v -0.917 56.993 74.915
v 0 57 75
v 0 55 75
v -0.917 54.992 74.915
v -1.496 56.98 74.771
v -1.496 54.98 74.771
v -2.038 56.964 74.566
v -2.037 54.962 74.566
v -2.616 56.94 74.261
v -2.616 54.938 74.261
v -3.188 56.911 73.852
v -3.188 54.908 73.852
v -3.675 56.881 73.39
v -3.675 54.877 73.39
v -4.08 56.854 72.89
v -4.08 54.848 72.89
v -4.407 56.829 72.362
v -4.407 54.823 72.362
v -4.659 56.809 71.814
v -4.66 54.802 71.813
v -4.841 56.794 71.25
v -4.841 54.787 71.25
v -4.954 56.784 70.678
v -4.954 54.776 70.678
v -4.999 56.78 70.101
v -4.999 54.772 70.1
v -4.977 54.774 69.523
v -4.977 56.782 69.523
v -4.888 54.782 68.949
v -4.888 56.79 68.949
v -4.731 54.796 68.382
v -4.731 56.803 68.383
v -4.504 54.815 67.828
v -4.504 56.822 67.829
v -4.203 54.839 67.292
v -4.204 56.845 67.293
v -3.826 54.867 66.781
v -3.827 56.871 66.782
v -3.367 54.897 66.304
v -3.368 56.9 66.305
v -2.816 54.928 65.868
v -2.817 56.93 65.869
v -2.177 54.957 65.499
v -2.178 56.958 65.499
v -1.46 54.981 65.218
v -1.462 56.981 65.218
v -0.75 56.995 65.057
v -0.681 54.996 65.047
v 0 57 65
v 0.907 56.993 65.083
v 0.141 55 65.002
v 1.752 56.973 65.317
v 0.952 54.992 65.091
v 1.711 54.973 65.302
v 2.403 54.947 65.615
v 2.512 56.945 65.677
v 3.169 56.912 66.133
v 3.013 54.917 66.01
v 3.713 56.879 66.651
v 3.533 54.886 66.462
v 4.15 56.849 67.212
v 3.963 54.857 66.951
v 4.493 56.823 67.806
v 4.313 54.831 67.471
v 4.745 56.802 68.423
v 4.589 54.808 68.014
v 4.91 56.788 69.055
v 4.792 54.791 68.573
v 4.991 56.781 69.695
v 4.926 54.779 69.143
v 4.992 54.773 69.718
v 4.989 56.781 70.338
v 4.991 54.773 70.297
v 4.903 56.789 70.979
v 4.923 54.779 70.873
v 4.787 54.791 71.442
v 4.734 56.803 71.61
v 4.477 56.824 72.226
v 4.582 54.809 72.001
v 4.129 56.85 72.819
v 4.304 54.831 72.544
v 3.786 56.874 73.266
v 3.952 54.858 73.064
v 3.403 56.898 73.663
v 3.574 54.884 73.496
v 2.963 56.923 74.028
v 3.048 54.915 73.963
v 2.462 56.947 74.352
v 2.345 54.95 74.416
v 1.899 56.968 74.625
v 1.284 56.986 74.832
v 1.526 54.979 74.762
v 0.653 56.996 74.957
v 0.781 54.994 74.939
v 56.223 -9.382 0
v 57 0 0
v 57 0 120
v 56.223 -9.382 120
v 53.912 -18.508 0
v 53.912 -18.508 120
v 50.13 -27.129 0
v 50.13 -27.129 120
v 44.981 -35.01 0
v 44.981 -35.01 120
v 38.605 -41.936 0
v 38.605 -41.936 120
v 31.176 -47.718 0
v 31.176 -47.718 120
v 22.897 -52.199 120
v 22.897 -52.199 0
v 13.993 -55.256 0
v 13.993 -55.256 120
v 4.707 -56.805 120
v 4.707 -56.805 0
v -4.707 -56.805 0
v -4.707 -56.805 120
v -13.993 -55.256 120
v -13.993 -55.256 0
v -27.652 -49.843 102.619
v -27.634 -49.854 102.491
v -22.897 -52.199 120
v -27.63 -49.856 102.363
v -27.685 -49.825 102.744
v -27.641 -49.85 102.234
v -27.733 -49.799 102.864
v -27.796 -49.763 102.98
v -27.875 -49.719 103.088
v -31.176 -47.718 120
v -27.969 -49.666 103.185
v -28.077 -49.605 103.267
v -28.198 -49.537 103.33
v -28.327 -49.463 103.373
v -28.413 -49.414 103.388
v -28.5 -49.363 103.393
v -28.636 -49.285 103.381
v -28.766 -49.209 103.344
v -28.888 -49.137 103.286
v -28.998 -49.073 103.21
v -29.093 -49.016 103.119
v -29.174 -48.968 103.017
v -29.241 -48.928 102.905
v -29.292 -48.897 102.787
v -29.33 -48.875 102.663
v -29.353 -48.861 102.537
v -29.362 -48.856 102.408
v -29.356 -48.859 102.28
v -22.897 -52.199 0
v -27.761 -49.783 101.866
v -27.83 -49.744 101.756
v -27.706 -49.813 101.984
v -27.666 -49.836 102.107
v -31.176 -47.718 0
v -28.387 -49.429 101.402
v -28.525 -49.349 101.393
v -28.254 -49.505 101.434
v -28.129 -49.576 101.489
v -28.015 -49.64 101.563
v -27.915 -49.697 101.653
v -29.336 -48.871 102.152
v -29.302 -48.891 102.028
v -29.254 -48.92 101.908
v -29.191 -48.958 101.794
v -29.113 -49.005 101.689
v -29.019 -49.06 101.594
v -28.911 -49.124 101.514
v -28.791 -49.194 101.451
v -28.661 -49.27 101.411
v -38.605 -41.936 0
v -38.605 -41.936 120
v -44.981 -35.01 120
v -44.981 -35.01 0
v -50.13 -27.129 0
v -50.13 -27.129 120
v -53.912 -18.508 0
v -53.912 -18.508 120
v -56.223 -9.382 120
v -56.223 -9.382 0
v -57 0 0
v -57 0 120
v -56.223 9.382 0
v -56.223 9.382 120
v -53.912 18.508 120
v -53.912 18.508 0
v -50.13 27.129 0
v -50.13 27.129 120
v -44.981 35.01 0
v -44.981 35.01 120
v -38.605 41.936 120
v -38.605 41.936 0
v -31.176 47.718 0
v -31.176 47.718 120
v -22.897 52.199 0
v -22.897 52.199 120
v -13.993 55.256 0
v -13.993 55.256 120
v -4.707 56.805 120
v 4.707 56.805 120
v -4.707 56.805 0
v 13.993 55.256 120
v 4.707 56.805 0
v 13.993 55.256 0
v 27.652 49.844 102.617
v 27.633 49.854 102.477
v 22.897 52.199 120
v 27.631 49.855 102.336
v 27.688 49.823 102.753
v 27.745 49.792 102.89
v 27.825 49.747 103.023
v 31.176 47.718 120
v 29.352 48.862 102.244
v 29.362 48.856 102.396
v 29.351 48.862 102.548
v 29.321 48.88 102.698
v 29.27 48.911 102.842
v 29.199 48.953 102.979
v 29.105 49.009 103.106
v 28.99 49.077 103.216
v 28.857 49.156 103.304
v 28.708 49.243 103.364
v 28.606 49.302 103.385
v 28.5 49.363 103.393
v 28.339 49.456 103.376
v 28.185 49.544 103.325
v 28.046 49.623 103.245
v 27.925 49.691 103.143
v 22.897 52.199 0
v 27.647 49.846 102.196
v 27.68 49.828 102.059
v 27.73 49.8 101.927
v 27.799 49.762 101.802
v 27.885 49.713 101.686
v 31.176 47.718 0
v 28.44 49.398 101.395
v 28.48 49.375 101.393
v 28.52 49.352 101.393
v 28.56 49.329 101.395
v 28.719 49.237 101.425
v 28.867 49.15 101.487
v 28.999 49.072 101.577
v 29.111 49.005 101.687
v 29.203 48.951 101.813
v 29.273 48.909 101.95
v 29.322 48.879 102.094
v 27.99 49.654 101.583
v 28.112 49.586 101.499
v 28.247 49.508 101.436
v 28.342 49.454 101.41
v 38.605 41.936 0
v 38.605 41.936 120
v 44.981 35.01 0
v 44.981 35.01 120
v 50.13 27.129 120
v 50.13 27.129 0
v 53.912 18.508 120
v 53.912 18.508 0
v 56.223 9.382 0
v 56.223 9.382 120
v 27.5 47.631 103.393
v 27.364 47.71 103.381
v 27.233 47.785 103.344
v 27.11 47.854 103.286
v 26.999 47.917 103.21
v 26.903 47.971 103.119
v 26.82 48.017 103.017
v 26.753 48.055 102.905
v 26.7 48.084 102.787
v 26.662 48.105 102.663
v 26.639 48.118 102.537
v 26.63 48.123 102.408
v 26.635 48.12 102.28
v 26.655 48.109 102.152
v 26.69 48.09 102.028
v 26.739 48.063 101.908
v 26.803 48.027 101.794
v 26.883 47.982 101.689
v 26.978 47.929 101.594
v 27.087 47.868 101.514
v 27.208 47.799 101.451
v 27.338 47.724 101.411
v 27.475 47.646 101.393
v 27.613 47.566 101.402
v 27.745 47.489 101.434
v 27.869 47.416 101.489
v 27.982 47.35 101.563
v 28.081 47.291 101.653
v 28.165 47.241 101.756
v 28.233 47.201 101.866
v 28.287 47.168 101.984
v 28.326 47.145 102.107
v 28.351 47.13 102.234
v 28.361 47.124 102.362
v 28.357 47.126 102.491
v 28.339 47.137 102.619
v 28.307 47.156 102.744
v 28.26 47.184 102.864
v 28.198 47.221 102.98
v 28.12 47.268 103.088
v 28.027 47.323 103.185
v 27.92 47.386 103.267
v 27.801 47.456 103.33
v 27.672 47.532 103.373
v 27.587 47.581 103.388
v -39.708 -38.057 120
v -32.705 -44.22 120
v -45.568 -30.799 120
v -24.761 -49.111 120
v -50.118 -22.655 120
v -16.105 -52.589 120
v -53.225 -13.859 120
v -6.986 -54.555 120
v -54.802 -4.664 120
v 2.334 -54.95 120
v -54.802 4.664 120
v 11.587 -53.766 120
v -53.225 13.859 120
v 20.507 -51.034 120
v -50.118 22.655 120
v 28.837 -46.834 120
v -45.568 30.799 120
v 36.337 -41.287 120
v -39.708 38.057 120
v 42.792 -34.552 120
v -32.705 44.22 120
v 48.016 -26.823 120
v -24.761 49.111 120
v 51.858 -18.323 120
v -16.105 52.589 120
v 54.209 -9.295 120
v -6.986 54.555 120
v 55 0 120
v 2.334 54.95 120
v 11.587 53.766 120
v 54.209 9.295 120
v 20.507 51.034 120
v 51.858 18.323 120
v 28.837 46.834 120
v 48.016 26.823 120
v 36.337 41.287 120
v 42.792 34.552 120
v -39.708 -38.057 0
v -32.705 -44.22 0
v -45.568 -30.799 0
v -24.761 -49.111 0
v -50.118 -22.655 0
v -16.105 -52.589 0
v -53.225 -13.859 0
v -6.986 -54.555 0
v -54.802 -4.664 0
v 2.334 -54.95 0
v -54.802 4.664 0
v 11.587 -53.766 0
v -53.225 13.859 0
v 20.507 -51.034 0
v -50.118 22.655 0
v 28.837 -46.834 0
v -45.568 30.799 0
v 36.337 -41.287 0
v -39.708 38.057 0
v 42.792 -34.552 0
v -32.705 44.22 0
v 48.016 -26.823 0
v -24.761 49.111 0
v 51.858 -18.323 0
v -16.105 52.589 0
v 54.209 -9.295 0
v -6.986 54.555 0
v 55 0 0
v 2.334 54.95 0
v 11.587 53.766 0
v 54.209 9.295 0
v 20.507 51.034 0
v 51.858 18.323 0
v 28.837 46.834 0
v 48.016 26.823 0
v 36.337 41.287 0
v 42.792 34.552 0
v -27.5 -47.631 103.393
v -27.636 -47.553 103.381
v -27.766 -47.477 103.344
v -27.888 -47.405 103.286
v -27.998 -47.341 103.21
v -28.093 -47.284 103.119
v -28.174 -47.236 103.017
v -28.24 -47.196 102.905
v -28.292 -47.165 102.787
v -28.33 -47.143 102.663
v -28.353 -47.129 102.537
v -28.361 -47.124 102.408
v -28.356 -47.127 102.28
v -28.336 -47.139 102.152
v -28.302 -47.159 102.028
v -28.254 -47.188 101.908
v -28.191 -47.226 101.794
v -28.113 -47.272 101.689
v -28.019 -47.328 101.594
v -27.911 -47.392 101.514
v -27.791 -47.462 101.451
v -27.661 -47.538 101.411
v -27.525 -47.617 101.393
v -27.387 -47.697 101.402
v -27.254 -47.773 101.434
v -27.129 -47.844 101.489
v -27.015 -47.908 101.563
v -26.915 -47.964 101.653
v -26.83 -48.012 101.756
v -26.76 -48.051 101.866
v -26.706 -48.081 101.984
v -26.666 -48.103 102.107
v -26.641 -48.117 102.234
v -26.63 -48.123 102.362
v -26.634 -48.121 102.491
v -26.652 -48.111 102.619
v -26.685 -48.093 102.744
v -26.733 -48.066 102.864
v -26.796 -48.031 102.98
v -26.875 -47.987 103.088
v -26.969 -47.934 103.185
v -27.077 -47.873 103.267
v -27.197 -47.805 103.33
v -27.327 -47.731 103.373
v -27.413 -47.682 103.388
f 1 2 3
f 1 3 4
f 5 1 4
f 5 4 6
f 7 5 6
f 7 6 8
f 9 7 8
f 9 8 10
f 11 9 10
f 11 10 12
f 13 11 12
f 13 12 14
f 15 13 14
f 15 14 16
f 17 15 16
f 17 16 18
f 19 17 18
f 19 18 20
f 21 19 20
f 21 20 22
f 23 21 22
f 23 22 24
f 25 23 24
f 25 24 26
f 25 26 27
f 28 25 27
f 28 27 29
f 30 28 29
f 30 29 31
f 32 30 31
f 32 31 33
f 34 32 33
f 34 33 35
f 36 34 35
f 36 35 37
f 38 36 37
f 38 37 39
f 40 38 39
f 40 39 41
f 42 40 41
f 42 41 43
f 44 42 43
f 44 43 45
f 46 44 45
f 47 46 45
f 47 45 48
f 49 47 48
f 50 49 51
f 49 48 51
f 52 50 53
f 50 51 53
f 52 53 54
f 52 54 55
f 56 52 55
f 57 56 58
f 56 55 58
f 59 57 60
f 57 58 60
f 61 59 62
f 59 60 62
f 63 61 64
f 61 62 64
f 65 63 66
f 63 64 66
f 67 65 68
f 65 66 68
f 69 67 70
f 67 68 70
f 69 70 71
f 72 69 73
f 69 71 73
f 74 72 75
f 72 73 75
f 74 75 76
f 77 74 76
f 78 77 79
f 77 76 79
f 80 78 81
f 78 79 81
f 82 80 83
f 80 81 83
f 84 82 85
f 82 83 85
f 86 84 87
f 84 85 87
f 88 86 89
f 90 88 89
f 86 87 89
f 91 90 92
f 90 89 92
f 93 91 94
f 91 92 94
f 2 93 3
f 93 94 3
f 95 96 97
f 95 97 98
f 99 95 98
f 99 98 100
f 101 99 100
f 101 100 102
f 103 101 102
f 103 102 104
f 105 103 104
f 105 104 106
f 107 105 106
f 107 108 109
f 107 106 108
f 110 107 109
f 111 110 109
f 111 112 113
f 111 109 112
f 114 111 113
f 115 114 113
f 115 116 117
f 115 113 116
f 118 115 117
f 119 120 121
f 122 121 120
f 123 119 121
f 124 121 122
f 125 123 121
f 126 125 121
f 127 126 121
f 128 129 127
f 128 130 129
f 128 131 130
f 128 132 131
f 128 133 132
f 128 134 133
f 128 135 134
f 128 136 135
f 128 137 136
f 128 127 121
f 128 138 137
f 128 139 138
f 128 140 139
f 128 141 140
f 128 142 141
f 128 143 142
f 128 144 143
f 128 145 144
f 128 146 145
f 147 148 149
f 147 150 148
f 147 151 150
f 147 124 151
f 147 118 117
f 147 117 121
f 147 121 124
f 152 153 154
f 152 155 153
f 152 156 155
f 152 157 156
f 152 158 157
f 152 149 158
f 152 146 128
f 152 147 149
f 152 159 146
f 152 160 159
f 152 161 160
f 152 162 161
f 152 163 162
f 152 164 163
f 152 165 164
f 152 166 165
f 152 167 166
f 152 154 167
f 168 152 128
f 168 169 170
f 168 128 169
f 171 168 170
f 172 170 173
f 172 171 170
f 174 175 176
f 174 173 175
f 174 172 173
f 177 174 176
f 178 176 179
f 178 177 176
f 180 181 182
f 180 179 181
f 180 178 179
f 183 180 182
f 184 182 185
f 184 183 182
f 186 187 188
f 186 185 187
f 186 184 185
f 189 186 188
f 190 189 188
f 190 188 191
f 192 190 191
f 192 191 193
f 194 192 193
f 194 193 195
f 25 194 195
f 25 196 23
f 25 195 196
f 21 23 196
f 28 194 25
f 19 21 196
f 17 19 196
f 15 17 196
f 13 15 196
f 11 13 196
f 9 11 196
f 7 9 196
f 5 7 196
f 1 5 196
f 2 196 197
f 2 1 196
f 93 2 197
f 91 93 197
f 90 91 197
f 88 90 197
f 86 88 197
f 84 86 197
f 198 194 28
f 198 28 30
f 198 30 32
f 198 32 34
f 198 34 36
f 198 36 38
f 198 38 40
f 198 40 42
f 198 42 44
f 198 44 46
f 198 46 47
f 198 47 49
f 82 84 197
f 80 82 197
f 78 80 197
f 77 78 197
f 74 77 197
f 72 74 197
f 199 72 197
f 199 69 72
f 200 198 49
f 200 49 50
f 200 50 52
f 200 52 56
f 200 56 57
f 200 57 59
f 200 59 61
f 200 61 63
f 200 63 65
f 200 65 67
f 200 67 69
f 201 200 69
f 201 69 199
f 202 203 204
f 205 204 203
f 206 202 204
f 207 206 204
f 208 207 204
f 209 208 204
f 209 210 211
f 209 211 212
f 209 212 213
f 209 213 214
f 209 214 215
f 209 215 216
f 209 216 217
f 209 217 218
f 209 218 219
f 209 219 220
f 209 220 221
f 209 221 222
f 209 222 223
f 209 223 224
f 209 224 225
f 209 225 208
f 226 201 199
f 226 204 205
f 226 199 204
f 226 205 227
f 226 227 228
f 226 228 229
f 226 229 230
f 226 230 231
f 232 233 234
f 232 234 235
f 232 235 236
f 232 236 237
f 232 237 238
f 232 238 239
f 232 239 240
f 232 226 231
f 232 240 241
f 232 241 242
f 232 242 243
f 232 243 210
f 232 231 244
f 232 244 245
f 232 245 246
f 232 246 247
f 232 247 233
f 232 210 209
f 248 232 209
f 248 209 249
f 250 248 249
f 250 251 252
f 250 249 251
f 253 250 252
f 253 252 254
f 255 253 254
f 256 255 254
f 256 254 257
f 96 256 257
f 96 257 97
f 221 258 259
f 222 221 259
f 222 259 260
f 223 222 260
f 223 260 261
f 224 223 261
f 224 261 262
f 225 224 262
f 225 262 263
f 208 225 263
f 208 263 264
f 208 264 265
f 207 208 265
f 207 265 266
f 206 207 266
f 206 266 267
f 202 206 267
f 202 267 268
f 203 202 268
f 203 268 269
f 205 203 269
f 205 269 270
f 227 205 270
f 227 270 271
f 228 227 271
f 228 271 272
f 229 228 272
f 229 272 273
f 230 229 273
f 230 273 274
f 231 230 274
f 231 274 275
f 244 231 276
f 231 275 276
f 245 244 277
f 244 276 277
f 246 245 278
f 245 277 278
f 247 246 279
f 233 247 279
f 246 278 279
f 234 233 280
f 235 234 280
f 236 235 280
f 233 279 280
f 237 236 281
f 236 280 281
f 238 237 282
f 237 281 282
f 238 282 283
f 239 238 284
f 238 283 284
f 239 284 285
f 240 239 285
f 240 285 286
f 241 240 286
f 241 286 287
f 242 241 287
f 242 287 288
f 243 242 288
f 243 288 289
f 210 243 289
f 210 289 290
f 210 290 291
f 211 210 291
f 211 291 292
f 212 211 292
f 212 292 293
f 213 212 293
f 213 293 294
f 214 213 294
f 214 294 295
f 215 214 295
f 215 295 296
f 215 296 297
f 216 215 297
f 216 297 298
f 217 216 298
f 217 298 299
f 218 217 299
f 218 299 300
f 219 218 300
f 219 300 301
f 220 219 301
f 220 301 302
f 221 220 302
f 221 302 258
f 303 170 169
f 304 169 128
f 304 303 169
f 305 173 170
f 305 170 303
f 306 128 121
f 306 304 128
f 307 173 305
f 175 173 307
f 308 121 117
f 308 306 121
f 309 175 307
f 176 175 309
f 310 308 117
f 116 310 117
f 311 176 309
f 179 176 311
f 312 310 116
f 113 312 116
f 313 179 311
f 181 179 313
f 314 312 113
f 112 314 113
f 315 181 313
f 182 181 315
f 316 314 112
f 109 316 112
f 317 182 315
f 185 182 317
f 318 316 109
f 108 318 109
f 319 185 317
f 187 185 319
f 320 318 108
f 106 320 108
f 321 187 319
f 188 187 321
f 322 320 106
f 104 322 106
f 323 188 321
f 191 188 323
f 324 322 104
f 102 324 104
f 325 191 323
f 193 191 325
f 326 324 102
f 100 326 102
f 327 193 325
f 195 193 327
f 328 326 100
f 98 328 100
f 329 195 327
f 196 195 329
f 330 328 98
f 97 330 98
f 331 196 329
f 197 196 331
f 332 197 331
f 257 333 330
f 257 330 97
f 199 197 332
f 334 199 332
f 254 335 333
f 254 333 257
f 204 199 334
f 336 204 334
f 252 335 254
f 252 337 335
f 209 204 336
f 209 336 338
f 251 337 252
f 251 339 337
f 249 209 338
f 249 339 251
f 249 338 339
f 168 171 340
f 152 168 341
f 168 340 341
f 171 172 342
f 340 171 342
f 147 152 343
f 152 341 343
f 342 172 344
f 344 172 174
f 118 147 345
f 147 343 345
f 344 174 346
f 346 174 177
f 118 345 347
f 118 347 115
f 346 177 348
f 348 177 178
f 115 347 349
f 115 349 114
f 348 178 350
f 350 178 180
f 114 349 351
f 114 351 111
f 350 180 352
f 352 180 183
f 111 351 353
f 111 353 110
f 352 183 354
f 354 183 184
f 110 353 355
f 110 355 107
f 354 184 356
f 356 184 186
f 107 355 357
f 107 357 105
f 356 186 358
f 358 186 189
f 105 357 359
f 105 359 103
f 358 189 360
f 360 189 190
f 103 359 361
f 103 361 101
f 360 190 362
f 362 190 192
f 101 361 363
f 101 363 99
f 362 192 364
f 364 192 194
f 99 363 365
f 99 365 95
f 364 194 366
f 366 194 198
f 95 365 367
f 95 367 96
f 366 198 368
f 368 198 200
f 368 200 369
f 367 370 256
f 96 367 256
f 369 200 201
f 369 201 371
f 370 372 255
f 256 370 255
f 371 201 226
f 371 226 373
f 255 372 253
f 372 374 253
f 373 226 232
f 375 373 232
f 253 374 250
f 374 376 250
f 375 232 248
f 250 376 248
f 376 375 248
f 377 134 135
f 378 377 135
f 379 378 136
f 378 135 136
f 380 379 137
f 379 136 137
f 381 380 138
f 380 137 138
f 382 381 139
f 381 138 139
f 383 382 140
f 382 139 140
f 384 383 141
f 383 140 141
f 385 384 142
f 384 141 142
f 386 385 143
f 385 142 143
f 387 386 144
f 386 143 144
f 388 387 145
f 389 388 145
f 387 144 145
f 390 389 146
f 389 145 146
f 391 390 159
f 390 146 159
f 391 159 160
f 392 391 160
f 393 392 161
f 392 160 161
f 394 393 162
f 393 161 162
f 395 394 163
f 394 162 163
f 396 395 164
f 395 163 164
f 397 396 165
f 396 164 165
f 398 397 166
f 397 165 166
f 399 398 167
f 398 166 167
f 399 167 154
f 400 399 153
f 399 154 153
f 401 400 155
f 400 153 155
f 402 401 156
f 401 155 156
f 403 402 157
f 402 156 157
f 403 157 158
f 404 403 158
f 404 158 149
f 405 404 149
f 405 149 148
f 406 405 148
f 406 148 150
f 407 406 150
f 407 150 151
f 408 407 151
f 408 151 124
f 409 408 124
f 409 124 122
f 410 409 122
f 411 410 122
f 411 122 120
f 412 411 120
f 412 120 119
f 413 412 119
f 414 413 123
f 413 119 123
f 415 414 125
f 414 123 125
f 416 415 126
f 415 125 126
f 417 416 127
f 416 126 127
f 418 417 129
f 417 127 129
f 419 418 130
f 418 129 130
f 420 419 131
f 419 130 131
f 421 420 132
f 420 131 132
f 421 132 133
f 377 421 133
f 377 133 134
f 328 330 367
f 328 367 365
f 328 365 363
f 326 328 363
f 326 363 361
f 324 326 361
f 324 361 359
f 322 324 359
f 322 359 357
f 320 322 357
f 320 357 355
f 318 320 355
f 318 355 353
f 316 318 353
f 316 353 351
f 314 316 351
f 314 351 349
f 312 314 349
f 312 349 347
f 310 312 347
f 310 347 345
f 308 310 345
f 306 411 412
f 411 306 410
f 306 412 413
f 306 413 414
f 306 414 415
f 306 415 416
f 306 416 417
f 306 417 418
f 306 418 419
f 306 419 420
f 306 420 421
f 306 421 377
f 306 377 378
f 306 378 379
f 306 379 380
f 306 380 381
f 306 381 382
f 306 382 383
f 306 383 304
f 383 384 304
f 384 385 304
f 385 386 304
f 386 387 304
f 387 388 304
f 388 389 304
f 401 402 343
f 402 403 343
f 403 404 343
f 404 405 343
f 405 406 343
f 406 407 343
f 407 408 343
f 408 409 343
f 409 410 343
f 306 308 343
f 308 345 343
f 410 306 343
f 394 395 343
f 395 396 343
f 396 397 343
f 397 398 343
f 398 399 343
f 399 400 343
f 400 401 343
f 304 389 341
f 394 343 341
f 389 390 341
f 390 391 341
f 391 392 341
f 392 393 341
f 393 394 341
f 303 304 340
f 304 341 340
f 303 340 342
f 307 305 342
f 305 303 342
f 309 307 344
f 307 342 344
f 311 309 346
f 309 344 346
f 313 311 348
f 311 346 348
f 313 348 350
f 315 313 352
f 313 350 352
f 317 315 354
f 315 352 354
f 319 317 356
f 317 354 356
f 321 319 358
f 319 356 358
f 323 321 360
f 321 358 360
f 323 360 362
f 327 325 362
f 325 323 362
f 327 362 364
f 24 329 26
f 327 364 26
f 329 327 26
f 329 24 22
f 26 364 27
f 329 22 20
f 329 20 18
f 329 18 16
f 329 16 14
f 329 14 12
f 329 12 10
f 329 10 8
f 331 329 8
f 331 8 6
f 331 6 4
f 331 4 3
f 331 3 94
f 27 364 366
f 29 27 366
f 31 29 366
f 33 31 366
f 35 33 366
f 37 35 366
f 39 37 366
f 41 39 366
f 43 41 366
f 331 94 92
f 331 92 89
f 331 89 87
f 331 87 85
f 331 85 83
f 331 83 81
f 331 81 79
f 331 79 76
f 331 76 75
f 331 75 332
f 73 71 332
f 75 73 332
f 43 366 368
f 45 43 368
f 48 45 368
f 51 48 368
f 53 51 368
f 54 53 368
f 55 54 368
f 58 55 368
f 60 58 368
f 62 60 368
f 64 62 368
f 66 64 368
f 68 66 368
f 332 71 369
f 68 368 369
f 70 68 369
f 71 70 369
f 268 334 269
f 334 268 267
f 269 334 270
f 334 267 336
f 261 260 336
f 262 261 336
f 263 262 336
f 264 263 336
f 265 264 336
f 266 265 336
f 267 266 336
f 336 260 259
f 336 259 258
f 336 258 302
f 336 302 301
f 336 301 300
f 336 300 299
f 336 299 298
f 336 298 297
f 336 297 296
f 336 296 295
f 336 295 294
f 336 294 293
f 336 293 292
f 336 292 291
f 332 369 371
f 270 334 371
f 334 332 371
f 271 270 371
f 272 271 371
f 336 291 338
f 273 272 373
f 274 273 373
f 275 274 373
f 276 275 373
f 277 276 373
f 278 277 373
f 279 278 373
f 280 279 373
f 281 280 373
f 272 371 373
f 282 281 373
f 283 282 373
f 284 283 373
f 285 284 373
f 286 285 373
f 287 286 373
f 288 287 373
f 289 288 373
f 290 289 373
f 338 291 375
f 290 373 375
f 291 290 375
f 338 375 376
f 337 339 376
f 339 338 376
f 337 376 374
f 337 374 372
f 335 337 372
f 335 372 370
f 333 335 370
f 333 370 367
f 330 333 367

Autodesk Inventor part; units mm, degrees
ref_plane "YZ Plane" through (0, 0, 0) normal (1, 0, 0) x (0, 1, 0)
ref_plane "XZ Plane" through (0, 0, 0) normal (0, 1, 0) x (-1, 0, 0)
sketch "Sketch1" plane through (0, 0, 0) normal (0, 0, 1) x (1, 0, 0)
  circle A0 centre (0, 0) radius 57
  circle A1 centre (0, 0) radius 55
  dimension "d0" = 114
  dimension "d1" = 110
extrude "Extrusion1" add sketch "Sketch1" along normal blind 120
sketch "Sketch2" plane through (0, 0, 120) normal (0, 0, 1) x (1, 0, 0)
  circle A0 centre (0, 0) radius 57 projected
  point P0 (0, 57)
ref_plane "Work Plane1" through (0, 57, 120) normal (0, 1, 0) x (-1, 0, 0)
sketch "Sketch3" plane through (0, 57, 120) normal (0, 1, 0) x (-1, 0, 0)
  line L0 (57, 0) -> (-57, 0) projected
  point P0 (0, -120)
  point P1 (0, -50)
  dimension "d4" = 50
hole "Hole1" at (0, 57, 70) direction (0, -1, 0) diameter 10 depth 20 tip angle 118
sketch "Sketch6" plane through (0, 0, 120) normal (0, 0, 1) x (1, 0, 0)
  circle A0 centre (0, 0) radius 57 projected
  point P0 (0, 57)
sketch "Sketch11" plane through (0, 0, 120) normal (0, 0, 1) x (1, 0, 0)
  circle A0 centre (0, 0) radius 57 projected
  line L0 (28.5, 49.3634) -> (0, 0)
  line L1 (57, 0) -> (0, 0)
  dimension "d47" = 60
ref_plane "Work Plane7" through (28.5, 49.3634, 120) normal (0.5, 0.8660254, 0) x (-0.8660254, 0.5, 0)
sketch "Sketch12" plane through (28.5, 49.3634, 120) normal (0.5, 0.8660254, 0) x (-0.8660254, 0.5, 0)
  line L0 (57, 0) -> (-57, 0) projected
  point P0 (0, -120)
  point P1 (0, -17.607)
  dimension "d48" = 17.607
hole "Hole6" at (28.5, 49.3634, 102.393) direction (-0.5, -0.8660254, 0) diameter 2 end through all
equation "\"d54\" = Thickness"
equation "\"BendRadius\" = Thickness"
equation "\"BendReliefWidth\" = Thickness"
equation "\"BendReliefDepth\" = 0.5 * Thickness"
equation "\"CornerReliefSize\" = 4 * Thickness"
equation "\"MinimumRemnant\" = 2 * Thickness"
equation "\"TransitionRadius\" = BendRadius"
equation "\"JacobiRadiusSize\" = BendRadius"
equation "\"GapSize\" = Thickness"
equation "\"Thickness\" = 0.5"
properties part number "Electromagnetic cover body"
